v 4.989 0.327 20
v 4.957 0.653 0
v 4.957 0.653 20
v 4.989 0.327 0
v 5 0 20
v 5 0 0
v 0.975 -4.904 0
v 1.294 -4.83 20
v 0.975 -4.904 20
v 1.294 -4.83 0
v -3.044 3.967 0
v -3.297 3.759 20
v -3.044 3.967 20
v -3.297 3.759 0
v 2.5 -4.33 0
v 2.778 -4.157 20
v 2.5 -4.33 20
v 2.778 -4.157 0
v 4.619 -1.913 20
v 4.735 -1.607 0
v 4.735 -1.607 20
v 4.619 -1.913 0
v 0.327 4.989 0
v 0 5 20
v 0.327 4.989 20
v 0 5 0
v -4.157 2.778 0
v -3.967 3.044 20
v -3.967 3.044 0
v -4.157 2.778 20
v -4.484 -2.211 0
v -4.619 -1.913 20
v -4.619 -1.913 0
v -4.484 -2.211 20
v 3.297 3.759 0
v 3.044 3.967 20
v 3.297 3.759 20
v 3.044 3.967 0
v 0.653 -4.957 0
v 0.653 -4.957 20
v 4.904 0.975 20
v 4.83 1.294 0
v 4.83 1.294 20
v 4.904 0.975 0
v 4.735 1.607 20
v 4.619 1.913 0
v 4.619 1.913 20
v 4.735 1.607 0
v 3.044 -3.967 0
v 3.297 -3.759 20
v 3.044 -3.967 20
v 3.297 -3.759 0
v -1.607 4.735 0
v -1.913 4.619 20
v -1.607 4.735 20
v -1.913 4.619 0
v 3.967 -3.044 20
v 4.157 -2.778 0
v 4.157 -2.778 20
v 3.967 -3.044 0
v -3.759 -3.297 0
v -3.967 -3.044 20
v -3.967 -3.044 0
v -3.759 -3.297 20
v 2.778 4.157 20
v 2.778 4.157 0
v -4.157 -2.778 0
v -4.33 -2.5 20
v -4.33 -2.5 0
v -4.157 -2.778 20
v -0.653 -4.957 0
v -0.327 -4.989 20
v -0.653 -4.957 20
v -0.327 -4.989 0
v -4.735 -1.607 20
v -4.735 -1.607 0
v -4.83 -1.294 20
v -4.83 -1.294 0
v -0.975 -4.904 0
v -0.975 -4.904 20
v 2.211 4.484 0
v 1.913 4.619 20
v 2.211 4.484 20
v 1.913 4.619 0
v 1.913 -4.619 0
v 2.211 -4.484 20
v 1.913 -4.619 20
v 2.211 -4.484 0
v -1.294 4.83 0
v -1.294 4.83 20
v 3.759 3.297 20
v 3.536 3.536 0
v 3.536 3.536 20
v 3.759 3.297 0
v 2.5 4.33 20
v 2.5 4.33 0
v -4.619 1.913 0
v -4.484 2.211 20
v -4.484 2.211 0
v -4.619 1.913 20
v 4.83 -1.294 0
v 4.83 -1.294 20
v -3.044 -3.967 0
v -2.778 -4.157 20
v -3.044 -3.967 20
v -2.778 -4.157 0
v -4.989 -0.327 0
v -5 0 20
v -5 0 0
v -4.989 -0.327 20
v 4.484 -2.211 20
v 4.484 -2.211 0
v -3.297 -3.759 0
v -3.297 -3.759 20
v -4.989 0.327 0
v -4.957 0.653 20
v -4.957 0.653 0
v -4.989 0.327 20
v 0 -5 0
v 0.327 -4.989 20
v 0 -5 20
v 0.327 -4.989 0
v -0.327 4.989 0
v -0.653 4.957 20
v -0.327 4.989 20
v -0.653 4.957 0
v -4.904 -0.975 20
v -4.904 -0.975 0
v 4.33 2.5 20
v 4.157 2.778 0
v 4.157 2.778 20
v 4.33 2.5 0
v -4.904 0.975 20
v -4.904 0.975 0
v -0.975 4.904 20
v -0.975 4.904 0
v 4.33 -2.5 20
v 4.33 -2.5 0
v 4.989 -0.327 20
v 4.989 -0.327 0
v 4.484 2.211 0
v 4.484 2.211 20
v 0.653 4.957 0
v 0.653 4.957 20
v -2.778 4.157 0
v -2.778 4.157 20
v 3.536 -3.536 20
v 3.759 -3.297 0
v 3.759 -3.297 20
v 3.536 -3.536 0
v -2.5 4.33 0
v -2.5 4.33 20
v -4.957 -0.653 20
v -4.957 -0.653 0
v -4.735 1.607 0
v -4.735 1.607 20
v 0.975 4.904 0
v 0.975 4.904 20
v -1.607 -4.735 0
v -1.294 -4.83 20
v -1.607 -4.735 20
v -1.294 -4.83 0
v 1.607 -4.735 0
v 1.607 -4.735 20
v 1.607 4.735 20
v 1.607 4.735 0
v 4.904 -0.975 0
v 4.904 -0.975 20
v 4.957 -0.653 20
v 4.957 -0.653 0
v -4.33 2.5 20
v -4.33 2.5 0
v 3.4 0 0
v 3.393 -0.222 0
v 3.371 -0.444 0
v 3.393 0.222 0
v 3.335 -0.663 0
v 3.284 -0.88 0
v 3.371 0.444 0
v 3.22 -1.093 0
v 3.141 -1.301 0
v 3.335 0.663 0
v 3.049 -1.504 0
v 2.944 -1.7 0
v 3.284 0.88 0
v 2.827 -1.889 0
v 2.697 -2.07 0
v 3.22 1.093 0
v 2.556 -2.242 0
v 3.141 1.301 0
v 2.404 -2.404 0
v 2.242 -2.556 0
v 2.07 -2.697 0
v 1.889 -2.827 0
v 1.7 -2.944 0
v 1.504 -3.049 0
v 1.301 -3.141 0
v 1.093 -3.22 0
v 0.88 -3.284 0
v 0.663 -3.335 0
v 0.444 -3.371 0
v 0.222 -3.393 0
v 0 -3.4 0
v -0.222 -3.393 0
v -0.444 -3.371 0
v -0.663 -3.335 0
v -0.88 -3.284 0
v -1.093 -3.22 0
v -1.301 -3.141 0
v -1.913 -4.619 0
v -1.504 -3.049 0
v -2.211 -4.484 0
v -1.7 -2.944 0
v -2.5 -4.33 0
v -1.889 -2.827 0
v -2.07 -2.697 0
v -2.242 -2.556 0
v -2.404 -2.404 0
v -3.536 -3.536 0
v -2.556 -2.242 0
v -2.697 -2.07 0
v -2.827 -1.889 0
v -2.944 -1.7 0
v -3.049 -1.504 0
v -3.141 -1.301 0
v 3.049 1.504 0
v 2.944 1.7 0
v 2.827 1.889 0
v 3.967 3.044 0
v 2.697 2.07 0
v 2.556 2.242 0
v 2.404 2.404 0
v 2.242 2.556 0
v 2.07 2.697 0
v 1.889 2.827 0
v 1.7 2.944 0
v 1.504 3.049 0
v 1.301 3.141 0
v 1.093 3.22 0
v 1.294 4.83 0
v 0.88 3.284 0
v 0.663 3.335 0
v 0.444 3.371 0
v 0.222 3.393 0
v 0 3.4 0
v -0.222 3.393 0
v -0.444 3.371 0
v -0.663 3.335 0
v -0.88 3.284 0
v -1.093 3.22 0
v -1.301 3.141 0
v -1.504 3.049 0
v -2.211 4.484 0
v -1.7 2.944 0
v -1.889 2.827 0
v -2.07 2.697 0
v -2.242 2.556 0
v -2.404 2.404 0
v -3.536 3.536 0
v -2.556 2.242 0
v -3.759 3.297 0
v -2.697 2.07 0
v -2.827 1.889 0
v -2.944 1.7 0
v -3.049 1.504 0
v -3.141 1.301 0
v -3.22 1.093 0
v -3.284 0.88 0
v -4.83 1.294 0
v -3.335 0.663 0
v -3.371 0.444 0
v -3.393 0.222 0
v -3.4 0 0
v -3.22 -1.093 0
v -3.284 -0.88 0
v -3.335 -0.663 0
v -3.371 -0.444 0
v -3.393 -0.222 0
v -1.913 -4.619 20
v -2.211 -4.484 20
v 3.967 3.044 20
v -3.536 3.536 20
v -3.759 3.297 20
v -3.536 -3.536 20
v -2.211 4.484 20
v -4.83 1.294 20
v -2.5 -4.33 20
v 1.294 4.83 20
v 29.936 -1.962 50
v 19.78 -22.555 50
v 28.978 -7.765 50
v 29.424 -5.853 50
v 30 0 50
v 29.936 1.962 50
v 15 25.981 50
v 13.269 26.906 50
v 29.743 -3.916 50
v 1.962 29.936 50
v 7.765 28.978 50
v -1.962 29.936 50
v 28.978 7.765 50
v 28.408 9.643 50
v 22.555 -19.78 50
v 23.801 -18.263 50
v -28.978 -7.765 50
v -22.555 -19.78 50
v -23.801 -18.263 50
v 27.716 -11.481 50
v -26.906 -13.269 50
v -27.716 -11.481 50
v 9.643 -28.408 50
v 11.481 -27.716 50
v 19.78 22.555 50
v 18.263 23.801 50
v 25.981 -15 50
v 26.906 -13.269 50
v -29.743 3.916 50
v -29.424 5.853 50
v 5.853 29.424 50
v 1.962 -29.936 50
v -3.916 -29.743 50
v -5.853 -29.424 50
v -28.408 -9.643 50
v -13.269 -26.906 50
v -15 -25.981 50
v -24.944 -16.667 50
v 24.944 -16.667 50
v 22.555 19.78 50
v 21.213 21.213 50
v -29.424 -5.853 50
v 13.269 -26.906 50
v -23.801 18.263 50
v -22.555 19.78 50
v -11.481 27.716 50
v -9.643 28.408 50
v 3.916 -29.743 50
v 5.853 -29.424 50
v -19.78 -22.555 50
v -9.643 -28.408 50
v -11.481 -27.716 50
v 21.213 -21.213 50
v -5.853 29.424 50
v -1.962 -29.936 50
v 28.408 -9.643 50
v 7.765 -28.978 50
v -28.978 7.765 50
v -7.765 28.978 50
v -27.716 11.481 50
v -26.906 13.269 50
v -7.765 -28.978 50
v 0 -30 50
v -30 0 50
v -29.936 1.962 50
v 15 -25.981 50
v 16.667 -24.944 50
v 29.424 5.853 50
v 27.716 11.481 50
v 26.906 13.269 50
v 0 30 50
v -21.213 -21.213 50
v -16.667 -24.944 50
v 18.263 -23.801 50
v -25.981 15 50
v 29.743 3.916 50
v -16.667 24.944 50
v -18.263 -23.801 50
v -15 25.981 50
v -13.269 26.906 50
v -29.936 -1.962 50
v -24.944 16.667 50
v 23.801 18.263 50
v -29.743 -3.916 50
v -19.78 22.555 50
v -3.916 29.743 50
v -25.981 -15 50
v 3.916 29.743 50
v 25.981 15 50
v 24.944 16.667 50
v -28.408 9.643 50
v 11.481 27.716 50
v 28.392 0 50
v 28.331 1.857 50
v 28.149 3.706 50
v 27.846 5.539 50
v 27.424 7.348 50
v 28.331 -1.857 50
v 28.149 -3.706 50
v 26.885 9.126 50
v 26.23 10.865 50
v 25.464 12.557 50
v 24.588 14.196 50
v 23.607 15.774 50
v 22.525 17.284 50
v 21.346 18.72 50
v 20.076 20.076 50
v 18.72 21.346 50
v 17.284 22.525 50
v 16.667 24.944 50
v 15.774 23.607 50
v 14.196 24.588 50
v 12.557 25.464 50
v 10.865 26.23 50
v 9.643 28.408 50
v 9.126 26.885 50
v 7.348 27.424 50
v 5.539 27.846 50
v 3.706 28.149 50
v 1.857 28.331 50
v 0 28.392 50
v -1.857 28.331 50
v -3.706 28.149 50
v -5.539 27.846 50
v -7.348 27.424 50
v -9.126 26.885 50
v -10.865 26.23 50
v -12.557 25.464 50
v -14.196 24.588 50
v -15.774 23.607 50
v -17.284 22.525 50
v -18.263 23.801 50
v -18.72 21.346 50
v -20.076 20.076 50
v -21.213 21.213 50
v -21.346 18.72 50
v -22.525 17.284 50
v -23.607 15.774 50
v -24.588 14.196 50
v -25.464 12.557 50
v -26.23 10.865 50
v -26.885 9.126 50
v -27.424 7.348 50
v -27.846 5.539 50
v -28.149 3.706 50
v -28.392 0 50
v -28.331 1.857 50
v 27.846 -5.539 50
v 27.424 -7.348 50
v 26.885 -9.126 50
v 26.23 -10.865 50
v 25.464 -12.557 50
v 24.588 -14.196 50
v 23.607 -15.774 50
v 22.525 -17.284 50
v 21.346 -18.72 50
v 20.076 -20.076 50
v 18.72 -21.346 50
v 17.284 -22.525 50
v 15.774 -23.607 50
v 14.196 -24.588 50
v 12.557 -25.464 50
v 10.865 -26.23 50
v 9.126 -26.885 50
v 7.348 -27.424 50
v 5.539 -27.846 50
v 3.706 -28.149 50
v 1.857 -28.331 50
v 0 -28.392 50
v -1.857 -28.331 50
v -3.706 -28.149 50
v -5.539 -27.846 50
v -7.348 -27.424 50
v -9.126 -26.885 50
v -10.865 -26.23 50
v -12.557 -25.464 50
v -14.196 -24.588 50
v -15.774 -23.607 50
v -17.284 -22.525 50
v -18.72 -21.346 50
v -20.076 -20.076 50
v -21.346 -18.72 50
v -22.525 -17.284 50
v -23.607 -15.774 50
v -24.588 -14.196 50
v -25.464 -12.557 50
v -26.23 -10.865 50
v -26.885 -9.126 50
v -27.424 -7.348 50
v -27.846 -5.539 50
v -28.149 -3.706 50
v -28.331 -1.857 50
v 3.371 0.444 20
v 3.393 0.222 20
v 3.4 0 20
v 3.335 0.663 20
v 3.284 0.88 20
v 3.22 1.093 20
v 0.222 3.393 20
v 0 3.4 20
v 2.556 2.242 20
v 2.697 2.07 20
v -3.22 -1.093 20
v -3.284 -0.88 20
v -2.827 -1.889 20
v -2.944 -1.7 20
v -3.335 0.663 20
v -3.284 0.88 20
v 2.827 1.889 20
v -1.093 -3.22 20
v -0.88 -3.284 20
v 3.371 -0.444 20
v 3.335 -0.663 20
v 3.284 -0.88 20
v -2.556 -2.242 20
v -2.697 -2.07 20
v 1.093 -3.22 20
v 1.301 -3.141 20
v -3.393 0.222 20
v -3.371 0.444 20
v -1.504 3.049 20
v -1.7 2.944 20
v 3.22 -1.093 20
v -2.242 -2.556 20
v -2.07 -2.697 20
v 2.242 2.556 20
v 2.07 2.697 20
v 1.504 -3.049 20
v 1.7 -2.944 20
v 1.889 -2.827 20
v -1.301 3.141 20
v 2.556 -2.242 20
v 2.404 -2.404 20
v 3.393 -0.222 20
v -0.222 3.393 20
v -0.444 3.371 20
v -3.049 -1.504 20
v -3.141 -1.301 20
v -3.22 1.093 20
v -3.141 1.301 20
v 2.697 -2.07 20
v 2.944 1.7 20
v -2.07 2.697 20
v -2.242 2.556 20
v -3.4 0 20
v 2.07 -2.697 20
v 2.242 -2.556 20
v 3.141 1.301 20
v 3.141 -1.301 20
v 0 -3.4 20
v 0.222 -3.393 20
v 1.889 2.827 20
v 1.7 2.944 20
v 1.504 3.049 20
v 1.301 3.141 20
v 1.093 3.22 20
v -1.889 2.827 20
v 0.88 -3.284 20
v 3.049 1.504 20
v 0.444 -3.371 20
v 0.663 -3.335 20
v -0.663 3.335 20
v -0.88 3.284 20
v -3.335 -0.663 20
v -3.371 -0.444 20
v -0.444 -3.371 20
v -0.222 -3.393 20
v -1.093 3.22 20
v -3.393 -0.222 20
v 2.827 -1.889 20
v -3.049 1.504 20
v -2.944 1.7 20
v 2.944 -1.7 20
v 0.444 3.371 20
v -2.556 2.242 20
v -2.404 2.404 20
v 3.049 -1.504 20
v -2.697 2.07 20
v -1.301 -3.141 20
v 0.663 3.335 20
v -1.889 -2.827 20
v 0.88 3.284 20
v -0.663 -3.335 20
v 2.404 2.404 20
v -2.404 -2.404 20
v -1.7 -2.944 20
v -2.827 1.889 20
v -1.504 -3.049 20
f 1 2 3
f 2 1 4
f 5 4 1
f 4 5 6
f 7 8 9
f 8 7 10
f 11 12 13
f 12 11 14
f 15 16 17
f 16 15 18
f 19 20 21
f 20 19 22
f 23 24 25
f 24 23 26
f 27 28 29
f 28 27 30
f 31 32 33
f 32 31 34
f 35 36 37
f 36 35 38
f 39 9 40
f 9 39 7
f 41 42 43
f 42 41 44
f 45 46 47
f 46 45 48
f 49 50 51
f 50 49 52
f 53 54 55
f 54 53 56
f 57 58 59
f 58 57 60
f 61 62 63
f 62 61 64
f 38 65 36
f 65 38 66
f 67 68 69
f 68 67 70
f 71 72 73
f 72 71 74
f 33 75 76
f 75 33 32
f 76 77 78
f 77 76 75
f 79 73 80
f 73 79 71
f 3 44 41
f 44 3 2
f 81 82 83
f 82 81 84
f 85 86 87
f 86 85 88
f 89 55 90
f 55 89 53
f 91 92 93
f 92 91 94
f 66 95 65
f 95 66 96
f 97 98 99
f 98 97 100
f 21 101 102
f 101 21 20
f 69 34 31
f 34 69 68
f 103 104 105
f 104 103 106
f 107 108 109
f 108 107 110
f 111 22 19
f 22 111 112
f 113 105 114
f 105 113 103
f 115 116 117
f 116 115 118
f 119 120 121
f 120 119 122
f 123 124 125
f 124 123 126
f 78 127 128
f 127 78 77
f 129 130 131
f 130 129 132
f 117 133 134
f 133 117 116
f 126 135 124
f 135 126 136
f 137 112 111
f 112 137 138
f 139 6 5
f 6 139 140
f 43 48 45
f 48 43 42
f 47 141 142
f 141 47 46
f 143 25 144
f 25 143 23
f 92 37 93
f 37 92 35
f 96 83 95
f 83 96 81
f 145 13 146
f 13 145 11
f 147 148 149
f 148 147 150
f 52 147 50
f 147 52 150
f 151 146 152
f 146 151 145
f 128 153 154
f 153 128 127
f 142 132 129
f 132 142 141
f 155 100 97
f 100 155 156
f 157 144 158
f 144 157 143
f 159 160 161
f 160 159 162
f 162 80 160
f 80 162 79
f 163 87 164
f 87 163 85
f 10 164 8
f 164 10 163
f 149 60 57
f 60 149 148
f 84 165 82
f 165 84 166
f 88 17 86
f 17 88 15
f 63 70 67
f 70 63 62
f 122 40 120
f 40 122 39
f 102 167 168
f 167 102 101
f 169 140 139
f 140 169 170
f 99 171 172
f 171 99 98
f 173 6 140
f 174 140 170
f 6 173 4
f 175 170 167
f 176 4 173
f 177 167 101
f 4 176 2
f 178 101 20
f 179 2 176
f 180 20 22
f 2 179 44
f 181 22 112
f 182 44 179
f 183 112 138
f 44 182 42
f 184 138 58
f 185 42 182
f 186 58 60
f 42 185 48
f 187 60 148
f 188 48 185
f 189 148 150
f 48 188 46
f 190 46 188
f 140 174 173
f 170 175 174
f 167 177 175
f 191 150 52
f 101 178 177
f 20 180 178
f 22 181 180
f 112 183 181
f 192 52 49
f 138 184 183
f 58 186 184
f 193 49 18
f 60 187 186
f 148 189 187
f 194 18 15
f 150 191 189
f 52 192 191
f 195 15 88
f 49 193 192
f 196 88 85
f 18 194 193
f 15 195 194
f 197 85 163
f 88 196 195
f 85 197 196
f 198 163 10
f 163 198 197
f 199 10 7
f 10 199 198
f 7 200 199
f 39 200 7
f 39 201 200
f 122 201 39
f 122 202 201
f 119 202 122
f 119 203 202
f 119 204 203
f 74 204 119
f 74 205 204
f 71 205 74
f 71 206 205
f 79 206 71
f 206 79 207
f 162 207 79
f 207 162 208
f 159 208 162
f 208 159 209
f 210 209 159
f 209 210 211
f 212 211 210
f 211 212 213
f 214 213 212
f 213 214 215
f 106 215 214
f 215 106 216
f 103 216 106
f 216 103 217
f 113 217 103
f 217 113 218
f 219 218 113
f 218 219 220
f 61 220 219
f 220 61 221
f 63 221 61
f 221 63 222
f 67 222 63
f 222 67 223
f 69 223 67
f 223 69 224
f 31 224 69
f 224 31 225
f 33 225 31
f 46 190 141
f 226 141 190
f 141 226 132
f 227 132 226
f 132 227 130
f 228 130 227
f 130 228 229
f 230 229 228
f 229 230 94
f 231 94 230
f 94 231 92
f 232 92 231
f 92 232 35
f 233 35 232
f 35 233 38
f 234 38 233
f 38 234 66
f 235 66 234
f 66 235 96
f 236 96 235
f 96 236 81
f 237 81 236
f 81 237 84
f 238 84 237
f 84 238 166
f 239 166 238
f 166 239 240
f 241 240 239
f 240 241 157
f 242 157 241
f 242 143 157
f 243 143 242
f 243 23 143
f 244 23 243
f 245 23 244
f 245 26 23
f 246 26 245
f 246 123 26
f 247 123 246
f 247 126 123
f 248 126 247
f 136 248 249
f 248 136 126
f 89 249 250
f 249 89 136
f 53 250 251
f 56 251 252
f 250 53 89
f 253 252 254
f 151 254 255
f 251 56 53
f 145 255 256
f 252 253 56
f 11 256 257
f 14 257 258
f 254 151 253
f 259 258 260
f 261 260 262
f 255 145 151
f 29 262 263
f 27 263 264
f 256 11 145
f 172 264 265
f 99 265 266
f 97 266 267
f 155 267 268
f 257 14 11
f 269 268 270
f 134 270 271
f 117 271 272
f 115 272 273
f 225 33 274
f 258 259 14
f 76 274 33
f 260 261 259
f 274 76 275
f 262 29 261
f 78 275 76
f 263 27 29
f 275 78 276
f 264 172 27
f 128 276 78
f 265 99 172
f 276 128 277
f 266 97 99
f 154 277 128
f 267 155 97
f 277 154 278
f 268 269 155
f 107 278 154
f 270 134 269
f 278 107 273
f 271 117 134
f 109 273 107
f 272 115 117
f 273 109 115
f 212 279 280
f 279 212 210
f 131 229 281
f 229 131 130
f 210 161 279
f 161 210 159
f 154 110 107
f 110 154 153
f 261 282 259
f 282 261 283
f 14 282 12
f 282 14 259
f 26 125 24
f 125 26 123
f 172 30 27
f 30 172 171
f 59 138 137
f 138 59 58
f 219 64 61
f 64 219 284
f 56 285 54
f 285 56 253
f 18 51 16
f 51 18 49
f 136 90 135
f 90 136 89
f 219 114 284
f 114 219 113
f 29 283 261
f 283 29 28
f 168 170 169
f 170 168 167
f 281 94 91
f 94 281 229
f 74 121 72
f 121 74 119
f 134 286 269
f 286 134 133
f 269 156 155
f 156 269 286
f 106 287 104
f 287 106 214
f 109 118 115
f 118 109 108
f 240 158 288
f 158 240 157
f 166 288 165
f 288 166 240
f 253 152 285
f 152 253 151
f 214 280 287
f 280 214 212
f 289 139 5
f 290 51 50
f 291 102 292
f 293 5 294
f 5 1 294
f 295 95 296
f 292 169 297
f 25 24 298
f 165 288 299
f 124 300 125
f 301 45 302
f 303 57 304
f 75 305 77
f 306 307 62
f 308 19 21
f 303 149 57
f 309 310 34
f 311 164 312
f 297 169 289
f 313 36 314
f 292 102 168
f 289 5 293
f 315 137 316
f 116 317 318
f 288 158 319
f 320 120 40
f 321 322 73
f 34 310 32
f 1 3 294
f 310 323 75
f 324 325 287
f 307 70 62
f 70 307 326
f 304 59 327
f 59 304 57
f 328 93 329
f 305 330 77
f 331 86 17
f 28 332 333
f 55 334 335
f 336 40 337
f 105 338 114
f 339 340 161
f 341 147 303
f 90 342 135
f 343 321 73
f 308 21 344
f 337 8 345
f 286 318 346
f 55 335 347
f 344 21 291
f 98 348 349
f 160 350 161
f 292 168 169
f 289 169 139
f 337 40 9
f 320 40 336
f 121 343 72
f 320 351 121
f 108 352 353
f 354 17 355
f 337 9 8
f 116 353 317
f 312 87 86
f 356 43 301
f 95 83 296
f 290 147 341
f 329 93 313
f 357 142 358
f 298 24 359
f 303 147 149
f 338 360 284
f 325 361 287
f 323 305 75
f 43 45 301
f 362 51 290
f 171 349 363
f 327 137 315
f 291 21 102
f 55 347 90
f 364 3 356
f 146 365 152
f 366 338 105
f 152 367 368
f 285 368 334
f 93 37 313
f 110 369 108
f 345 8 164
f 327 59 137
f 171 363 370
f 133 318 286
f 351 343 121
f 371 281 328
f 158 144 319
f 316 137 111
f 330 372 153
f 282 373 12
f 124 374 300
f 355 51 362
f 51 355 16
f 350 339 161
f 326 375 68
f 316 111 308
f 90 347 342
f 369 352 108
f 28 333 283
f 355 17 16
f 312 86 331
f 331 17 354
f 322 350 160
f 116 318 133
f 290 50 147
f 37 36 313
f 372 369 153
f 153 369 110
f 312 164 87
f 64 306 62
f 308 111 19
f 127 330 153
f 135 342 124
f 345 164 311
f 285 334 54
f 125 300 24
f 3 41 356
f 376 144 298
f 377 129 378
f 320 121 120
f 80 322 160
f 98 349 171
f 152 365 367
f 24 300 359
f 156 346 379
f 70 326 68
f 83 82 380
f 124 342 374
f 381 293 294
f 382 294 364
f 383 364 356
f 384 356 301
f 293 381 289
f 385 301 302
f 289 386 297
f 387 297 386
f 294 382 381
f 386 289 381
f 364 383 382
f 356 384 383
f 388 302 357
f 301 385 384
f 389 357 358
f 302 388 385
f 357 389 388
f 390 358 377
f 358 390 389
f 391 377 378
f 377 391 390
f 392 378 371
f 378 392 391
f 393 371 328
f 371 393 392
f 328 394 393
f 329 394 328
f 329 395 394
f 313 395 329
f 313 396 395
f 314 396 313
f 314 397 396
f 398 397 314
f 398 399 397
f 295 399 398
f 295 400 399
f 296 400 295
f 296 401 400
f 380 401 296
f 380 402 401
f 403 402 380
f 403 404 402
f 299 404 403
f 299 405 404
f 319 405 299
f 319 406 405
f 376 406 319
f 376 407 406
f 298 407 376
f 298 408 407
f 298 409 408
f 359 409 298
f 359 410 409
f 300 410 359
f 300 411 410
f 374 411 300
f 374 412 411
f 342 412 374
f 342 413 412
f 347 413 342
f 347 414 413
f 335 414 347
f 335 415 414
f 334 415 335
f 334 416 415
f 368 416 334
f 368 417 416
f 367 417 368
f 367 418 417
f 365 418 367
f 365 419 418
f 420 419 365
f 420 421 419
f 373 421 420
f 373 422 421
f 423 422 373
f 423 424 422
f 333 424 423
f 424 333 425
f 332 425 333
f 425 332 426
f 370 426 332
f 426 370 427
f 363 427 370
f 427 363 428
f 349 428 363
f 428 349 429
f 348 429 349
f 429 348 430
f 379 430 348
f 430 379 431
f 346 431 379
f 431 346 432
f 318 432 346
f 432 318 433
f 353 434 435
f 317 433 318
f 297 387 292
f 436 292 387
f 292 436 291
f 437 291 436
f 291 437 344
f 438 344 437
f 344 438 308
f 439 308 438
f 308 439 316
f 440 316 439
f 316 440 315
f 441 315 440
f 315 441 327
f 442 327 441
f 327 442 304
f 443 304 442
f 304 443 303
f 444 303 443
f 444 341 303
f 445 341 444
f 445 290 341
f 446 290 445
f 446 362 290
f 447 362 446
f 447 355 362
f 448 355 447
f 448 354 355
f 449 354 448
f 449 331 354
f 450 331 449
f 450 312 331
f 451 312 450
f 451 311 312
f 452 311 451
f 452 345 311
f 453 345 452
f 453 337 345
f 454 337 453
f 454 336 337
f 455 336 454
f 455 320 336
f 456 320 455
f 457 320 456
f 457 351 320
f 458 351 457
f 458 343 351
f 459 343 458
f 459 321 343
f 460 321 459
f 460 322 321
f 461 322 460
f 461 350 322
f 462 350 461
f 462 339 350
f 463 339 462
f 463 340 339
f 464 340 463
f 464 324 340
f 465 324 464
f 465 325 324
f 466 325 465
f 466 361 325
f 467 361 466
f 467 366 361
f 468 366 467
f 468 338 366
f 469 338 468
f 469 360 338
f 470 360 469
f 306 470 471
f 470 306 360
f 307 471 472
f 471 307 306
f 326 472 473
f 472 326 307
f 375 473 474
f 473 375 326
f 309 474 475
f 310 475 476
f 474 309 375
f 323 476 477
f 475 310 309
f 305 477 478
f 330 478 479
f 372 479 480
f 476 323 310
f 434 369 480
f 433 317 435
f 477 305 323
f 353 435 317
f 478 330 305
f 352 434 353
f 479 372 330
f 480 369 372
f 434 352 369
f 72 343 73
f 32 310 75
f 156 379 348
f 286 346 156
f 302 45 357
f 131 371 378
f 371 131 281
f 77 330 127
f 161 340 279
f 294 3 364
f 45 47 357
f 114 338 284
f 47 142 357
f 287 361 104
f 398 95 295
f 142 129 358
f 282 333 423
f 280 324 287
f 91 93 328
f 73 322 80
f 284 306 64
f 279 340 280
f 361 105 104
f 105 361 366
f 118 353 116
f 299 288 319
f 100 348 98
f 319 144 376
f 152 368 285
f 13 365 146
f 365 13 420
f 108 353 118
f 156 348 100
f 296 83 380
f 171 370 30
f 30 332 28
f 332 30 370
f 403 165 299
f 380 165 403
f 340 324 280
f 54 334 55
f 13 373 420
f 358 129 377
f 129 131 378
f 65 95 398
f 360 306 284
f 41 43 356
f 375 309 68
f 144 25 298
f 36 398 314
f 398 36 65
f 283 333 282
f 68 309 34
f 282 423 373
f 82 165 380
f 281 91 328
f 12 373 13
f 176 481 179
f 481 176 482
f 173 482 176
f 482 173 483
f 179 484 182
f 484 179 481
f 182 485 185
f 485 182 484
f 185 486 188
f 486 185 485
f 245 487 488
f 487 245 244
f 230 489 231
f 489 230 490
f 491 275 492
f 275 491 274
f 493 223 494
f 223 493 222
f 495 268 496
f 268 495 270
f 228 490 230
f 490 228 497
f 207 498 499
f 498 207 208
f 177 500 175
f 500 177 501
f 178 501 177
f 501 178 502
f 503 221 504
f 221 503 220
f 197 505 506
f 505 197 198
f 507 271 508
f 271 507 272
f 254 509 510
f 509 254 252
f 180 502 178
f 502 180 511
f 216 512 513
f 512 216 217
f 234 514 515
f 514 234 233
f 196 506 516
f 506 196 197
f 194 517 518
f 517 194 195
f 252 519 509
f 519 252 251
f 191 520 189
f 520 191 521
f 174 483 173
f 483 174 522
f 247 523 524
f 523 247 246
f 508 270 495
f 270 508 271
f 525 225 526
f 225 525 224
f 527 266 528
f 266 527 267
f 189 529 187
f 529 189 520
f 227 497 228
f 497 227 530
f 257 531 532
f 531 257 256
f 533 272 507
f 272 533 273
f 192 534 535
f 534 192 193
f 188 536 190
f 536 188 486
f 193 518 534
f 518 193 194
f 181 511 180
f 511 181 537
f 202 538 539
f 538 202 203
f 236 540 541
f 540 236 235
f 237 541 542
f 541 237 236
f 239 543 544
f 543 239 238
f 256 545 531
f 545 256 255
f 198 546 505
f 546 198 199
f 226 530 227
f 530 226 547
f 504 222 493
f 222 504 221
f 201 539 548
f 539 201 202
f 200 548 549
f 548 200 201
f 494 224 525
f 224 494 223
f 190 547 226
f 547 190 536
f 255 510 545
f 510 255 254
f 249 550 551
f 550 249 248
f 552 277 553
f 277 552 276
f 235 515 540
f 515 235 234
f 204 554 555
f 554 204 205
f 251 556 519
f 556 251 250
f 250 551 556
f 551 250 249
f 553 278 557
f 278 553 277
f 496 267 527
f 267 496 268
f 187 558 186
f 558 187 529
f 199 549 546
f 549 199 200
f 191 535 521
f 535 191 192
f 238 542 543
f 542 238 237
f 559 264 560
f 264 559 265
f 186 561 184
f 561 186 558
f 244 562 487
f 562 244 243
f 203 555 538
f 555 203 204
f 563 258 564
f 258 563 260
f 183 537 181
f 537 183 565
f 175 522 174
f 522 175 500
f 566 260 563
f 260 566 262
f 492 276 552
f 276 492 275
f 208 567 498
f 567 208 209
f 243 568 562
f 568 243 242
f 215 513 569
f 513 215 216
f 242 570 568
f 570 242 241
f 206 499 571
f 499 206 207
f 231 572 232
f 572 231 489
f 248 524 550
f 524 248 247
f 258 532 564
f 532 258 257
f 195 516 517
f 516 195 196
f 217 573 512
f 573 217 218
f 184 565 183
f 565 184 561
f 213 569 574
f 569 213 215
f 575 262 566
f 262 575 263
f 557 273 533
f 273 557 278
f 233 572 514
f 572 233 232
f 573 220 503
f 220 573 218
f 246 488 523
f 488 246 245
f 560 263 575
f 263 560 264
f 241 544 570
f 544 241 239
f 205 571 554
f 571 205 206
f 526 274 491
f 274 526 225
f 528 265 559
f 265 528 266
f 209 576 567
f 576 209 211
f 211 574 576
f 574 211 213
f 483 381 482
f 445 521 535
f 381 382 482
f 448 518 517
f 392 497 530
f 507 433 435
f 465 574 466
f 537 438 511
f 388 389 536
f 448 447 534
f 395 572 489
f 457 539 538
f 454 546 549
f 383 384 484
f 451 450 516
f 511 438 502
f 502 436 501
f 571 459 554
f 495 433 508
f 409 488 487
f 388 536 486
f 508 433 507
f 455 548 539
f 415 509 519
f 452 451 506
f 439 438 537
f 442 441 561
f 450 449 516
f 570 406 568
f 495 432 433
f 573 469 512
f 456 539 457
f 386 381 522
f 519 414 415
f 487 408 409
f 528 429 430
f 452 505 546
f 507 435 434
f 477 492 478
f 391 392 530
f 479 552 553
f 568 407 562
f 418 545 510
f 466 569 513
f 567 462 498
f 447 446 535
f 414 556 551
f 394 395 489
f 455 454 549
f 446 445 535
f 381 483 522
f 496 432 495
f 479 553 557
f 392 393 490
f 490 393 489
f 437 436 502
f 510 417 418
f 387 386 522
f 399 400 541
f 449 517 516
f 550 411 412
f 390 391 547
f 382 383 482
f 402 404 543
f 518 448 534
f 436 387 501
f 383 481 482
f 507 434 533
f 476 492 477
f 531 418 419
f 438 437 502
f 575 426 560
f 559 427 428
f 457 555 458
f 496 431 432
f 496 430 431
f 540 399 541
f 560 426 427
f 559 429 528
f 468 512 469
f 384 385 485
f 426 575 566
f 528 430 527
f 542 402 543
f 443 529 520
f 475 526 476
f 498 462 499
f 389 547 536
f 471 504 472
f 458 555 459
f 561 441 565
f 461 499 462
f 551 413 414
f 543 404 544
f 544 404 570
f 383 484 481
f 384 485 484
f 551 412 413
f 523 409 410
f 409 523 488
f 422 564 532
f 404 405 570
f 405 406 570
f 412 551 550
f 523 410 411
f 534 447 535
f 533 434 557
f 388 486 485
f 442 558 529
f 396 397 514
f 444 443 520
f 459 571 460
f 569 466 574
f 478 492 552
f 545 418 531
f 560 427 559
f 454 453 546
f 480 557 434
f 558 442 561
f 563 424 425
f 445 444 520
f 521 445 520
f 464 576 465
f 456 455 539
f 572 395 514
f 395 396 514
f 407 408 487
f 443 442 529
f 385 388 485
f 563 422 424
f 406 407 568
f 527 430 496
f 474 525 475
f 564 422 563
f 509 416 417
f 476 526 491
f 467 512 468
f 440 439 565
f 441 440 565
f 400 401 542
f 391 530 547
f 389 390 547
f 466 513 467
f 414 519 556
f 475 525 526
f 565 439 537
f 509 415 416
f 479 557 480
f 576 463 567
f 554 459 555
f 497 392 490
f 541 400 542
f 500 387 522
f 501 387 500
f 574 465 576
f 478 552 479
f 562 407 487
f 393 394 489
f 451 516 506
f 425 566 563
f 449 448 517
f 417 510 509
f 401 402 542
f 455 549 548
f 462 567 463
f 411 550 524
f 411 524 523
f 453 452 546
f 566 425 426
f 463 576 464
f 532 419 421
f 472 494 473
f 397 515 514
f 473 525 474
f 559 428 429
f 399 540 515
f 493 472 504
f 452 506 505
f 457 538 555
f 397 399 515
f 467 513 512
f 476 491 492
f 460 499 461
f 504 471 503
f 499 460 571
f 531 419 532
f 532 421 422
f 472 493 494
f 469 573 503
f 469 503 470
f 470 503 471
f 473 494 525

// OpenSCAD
// Small lab funnel, 60 mm, with straight spout
// Category: tools. Cone walls stay below 45 deg from vertical, so it prints upright
// without supports.
// Print: PETG or PP for chemical resistance, 0.2 mm layers, 3+ perimeters.
// SPDX-License-Identifier: CERN-OHL-P-2.0

/* [Funnel] */
top_od = 60;           // outer diameter at the rim
spout_od = 10;         // outer diameter of the spout
wall = 1.6;
spout_h = 20;          // spout from z = 0 to z = spout_h
cone_h = 30;           // cone from z = spout_h to the rim

/* [Hidden] */
$fn = 96;
eps = 0.01;

difference() {
    union() {
        cylinder(d = spout_od, h = spout_h + eps);
        translate([0, 0, spout_h]) cylinder(d1 = spout_od, d2 = top_od, h = cone_h);
    }
    translate([0, 0, -eps]) cylinder(d = spout_od - 2 * wall, h = spout_h + 2 * eps);
    translate([0, 0, spout_h]) cylinder(d1 = spout_od - 2 * wall, d2 = top_od - 2 * wall, h = cone_h + eps);
}
